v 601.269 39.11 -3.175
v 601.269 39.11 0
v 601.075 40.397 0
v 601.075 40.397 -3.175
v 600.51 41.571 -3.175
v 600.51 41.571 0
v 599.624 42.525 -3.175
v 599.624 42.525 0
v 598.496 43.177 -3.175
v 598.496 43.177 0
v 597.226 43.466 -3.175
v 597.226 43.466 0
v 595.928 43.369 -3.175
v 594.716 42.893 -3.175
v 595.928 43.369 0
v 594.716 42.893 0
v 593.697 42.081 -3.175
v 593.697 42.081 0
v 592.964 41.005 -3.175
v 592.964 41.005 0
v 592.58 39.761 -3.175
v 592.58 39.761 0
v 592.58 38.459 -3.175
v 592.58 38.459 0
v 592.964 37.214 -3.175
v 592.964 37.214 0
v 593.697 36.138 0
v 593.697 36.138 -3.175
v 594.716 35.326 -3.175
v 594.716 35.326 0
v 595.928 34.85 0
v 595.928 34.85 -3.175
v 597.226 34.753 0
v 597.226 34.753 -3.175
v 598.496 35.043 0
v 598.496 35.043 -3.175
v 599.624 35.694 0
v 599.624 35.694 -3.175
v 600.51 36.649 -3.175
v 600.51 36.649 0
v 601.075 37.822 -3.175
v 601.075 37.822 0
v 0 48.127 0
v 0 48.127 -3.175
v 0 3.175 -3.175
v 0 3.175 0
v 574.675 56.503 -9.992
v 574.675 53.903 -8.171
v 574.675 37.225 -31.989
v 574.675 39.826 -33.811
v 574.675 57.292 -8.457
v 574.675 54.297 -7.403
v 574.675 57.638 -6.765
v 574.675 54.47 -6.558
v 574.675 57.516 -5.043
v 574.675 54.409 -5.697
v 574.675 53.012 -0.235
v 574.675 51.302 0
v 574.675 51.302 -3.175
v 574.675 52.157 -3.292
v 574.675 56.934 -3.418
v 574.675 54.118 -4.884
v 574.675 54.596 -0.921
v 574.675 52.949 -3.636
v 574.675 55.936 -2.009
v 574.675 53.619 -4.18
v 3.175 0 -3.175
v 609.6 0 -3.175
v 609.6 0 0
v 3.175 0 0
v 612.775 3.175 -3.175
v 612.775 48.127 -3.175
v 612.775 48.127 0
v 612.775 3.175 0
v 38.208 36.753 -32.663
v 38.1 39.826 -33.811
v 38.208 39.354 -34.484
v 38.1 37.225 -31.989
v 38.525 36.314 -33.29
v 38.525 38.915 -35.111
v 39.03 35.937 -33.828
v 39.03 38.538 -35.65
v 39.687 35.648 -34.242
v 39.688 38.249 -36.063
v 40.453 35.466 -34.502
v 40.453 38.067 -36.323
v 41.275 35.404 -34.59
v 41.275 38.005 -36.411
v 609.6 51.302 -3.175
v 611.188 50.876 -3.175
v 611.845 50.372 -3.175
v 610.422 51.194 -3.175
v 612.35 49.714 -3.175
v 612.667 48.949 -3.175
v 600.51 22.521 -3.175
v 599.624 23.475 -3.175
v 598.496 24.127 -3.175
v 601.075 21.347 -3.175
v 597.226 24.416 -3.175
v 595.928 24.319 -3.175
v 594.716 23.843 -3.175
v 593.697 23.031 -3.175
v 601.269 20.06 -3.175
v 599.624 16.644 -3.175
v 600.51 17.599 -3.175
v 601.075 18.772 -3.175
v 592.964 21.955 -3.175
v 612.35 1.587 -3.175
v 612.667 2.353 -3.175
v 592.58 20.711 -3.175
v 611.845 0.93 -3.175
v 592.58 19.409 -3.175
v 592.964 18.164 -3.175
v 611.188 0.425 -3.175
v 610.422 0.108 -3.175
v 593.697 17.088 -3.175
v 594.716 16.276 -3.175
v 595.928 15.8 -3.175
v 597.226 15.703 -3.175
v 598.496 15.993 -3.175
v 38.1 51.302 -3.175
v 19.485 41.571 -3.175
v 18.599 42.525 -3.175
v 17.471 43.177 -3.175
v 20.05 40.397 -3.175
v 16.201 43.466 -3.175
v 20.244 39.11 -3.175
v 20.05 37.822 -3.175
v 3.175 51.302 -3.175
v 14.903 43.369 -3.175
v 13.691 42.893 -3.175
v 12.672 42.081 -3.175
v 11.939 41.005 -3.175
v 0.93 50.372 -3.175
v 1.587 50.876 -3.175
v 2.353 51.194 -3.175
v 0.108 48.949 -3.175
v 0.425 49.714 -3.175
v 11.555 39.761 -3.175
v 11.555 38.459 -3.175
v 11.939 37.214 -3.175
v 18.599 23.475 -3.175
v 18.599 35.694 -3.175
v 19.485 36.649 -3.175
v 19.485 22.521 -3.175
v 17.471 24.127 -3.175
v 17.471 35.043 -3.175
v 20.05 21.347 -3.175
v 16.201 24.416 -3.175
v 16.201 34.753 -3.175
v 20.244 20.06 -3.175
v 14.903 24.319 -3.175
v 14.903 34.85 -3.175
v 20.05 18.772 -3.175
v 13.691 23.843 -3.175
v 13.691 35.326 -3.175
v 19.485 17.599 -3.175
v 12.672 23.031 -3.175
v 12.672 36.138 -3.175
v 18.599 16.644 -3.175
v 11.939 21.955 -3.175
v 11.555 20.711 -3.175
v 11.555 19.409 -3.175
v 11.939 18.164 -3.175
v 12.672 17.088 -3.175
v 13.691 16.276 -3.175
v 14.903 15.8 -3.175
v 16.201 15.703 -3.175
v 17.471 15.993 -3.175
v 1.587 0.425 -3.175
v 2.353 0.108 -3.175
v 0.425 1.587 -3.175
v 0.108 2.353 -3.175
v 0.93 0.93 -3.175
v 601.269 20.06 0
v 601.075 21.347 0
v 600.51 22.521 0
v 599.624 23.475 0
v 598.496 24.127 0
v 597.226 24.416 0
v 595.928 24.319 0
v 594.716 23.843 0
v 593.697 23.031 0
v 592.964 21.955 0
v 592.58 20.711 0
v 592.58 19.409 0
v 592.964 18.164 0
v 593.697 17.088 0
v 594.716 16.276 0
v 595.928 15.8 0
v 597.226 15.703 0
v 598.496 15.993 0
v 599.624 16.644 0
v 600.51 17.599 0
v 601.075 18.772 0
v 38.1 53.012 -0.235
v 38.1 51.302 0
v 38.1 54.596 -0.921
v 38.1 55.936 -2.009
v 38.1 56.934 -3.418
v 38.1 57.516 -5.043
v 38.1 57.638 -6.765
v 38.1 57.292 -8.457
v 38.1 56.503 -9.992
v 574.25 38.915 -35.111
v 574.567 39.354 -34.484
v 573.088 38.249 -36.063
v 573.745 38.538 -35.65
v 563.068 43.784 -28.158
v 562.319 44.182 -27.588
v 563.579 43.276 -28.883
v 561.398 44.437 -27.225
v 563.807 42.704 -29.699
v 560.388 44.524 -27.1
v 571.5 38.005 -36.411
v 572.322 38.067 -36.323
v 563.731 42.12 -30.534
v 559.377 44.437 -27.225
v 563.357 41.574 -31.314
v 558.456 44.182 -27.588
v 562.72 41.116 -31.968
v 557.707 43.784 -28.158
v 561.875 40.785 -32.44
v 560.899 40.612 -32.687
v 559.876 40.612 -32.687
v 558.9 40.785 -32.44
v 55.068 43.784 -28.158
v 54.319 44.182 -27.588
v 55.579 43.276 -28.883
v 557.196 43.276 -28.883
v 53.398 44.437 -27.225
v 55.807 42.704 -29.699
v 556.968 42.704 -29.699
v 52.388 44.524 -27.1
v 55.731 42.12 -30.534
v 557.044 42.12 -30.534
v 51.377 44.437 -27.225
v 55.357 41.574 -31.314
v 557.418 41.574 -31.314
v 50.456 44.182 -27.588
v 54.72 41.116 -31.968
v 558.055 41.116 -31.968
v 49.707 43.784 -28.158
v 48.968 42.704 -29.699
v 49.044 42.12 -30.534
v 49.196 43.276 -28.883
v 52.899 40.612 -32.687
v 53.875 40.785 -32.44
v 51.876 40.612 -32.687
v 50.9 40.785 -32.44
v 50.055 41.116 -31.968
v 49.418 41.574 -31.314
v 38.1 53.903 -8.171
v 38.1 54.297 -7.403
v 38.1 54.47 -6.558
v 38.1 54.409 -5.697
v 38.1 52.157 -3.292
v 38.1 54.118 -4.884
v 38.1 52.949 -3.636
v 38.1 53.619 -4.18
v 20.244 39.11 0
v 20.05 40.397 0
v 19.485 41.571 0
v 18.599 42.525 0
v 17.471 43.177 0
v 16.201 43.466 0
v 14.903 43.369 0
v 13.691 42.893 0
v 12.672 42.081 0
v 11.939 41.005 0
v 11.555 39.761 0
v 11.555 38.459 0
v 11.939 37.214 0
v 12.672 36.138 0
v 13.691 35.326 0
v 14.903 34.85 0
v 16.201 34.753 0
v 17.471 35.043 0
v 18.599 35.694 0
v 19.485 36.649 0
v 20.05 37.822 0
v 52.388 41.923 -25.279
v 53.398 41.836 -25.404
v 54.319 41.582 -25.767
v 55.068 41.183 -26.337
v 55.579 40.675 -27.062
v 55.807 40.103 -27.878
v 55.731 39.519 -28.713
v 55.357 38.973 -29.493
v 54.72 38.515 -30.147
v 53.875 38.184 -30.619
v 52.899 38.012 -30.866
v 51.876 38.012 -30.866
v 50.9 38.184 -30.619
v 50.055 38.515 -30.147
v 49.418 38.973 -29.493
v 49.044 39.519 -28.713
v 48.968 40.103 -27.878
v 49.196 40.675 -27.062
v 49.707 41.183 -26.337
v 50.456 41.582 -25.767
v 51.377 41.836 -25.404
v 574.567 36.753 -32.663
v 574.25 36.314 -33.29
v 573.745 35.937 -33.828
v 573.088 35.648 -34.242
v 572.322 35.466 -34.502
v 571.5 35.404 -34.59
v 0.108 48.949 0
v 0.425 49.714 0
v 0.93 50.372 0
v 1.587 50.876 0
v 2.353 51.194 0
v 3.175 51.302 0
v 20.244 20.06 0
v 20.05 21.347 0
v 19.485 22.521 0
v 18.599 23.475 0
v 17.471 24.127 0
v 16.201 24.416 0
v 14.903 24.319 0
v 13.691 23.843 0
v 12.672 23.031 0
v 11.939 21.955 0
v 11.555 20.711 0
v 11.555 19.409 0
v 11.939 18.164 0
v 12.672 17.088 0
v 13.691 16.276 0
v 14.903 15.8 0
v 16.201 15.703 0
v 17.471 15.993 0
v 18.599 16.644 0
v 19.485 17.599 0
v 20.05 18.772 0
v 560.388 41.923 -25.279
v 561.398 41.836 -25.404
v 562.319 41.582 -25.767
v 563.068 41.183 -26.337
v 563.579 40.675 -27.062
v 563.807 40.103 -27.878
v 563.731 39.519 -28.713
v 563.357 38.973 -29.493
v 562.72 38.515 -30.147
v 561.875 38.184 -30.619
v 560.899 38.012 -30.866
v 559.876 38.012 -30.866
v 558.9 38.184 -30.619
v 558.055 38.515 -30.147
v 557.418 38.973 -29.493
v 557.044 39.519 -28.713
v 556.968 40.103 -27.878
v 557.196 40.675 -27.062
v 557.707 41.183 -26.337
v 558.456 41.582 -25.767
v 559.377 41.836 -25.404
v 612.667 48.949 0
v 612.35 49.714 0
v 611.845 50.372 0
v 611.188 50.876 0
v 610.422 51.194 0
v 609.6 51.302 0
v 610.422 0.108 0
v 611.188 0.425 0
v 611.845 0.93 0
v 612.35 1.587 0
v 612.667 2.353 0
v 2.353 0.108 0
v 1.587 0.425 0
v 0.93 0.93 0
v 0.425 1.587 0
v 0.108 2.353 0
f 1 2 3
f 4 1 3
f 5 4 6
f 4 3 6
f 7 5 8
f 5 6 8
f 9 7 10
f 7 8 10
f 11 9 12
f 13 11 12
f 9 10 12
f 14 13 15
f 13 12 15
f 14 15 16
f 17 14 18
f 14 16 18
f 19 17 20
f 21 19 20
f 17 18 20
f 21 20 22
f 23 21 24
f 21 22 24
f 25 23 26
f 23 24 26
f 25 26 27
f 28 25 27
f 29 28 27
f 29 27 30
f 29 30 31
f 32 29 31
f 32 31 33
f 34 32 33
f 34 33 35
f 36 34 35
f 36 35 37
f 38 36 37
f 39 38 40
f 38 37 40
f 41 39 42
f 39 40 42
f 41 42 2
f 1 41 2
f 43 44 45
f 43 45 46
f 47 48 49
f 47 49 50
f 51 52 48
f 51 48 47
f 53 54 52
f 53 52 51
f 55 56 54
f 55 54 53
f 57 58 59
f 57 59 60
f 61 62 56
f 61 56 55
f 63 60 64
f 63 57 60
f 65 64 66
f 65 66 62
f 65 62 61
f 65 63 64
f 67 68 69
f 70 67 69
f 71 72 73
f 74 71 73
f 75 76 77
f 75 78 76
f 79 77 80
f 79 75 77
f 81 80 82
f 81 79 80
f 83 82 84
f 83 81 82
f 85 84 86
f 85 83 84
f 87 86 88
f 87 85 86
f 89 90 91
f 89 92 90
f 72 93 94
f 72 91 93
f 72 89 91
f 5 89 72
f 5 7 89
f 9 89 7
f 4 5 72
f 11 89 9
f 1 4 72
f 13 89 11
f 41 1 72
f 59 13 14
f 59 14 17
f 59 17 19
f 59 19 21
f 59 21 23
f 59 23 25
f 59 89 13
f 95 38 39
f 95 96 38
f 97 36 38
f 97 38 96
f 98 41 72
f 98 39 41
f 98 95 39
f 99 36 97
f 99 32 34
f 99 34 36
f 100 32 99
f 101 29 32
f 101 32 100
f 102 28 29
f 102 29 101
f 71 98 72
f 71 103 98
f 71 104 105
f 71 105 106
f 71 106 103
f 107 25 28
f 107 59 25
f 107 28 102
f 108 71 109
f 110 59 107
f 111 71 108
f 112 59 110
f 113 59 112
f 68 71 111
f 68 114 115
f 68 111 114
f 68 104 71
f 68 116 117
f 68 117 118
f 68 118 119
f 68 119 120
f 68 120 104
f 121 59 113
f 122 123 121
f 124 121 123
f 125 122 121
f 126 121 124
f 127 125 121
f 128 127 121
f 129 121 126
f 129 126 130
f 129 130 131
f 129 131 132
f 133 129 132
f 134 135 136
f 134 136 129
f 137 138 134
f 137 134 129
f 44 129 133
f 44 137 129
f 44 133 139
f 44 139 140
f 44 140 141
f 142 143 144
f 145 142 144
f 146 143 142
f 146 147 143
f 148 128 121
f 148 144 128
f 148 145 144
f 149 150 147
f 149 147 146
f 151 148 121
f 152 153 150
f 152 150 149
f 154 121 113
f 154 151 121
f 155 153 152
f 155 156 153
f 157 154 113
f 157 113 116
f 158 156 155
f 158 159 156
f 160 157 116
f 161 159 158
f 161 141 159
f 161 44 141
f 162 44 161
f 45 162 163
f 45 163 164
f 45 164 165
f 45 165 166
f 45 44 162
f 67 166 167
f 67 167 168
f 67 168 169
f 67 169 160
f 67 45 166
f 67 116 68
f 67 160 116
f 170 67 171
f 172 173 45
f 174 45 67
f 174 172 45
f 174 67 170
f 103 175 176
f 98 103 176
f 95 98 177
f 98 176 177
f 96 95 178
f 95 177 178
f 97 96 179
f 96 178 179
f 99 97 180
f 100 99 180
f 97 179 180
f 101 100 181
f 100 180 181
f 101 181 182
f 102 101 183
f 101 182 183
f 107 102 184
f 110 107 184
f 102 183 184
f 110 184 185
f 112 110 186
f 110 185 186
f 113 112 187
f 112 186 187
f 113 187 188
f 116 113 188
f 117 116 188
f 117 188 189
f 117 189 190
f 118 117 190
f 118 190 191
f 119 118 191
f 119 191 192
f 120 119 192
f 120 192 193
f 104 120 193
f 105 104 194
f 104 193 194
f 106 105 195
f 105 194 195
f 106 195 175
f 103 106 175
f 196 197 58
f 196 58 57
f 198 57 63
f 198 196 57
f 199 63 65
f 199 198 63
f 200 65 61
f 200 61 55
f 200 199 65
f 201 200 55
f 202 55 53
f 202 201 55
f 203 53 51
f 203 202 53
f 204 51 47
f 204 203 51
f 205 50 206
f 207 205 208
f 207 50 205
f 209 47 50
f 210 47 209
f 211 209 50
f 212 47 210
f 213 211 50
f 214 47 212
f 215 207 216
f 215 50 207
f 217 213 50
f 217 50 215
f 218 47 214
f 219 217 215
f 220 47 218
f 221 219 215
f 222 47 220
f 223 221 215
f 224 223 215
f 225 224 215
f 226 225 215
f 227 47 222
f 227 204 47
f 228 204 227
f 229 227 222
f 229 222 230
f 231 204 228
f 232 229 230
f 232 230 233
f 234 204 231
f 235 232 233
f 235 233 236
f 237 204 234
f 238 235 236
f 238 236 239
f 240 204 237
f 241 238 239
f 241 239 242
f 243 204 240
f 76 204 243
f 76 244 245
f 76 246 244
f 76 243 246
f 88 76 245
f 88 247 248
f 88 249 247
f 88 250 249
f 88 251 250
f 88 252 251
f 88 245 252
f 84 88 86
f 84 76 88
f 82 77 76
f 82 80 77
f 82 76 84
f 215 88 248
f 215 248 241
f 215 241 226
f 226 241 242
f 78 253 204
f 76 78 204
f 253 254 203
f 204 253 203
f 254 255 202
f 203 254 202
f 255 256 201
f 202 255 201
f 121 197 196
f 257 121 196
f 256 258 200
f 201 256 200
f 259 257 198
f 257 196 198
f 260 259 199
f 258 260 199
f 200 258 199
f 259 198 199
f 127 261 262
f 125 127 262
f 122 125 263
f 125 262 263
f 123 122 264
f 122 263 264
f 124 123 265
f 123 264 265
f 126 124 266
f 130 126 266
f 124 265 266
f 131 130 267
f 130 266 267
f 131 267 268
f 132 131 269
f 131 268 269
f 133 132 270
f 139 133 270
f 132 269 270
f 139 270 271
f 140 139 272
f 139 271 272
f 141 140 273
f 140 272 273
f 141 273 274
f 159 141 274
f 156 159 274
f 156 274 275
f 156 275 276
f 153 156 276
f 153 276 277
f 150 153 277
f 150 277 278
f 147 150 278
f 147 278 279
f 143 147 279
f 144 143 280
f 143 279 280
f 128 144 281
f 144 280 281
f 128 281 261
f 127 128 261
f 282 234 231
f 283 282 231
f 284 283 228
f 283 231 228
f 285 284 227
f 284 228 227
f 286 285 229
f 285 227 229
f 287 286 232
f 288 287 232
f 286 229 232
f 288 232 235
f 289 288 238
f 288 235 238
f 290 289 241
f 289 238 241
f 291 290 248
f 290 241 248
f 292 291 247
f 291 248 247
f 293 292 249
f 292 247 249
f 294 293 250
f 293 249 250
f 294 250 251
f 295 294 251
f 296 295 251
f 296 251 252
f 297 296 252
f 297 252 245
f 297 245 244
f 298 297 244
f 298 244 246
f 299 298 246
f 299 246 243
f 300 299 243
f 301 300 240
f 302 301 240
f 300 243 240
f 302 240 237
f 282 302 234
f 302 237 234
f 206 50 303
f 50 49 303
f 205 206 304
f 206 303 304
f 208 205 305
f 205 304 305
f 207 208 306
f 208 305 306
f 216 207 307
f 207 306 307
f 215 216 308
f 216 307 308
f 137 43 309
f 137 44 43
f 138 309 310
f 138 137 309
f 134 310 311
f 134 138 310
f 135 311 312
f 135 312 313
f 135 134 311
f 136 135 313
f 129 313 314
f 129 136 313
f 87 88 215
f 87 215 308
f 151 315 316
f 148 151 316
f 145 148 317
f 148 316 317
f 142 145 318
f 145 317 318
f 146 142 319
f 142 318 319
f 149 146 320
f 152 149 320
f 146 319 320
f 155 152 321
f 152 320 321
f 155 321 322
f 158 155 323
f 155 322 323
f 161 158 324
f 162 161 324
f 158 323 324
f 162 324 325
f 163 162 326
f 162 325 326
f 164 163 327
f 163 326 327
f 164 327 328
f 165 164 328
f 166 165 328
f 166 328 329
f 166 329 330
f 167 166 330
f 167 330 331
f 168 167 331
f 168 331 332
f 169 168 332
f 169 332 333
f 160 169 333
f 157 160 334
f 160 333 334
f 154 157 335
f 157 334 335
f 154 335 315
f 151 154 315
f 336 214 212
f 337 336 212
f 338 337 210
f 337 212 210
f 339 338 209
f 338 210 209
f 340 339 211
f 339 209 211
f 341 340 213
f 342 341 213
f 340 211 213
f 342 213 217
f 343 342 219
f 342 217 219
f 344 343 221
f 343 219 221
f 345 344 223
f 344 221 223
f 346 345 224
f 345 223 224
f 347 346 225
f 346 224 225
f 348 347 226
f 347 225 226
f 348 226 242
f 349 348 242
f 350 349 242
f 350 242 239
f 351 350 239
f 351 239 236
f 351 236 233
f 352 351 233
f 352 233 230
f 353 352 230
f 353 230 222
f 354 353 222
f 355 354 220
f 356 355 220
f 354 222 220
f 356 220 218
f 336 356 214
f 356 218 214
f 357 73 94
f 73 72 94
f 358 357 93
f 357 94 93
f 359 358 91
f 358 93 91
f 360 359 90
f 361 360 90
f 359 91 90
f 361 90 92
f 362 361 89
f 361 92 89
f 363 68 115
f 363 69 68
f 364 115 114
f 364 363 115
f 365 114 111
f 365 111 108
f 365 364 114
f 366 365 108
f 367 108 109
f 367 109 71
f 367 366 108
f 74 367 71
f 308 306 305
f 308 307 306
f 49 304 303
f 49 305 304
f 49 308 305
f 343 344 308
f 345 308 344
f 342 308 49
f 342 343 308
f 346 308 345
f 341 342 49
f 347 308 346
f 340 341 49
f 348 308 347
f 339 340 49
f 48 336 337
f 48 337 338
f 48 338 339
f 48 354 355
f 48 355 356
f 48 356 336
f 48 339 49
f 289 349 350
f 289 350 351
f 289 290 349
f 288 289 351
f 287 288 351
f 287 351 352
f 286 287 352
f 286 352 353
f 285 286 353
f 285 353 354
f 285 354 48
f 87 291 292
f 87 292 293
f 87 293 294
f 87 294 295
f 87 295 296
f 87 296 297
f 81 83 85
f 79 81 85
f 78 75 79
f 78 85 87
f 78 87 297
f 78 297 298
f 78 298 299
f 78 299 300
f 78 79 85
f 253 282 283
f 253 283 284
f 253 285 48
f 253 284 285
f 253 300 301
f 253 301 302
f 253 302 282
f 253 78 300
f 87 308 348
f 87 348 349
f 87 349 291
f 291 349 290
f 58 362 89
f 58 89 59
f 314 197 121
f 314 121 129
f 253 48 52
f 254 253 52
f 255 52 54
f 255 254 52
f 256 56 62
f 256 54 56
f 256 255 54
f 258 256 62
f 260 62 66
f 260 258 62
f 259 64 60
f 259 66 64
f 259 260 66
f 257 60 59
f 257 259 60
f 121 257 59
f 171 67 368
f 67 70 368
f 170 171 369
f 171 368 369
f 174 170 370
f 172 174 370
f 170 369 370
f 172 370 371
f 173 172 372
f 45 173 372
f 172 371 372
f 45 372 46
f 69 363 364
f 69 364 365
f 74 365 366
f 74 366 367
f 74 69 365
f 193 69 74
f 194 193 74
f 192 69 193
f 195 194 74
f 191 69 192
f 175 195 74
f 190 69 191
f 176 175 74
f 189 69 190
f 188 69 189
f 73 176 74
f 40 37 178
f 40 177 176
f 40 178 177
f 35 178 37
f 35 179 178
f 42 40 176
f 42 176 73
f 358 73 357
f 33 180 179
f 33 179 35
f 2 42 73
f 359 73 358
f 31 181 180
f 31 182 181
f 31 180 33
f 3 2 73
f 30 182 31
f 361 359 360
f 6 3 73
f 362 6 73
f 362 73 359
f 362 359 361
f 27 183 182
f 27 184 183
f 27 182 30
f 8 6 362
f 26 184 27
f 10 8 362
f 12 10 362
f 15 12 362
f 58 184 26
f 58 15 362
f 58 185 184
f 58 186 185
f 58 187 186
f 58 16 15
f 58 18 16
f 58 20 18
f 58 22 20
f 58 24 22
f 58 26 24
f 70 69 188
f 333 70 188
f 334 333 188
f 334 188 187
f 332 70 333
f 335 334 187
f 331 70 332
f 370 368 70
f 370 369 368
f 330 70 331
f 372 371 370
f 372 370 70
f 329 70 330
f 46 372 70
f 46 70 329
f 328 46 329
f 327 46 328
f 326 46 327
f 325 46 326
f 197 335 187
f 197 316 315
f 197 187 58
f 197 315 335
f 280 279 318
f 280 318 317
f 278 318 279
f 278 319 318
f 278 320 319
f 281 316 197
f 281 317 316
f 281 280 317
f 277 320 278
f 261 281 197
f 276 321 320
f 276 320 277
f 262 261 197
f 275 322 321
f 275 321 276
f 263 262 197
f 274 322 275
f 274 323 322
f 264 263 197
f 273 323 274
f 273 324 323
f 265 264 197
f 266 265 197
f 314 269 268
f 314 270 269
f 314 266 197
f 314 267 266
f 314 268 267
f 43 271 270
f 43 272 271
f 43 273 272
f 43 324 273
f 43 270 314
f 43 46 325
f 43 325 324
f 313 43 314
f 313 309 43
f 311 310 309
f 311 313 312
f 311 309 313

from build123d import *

# Parameters (mm, degrees)
BASE_FLANGE1_DEPTH       = 612.775
CUT_EXTRUDE1_OUTLINE_W   = 38.1
CUT_EXTRUDE1_OUTLINE_H   = 57.651763494
CUT_EXTRUDE1_DEPTH       = 33.236308369
CUT_EXTRUDE1_START       = -3.175
CUT_EXTRUDE1_2_OUTLINE_W = 38.1
CUT_EXTRUDE1_2_OUTLINE_H = 6.35
CUT_EXTRUDE1_2_DEPTH     = 3.175
SKETCH7_R                = 4.3688
CUT_EXTRUDE2_DEPTH       = 3.175
SKETCH8_R                = 3.429
CUT_EXTRUDE3_DEPTH       = 3.175
FILLET1_R                = 3.175


# Read off the part's stored shape, not the designer's step: Cut-Extrude1
# Sheet-metal steps are written as plain solids
with BuildPart() as part:
    # Sketch1 → Base-Flange1 (new body)
    with BuildSketch(Plane(origin=(0, 0, 0), x_dir=(0, 0, -1), z_dir=(1, 0, 0))):
        with BuildLine():
            Line((0, 0), (0, 51.301763494))
            ThreePointArc((0, 51.301763494), (3.417896306, 56.934282284), (9.992210371, 56.503378975))
            Line((9.992210371, 56.503378975), (36.411308369, 38.004527404))
            Line((36.411308369, 38.004527404), (34.590203183, 35.403719664))
            Line((34.590203183, 35.403719664), (8.171105185, 53.902571234))
            ThreePointArc((8.171105185, 53.902571234), (4.883948153, 54.118022889), (3.175, 51.301763494))
            Line((3.175, 51.301763494), (3.175, 0))
            Line((3.175, 0), (0, 0))
        make_face()
    extrude(amount=BASE_FLANGE1_DEPTH)

    # Cut-Extrude1 outline → Cut-Extrude1 (cut)
    with BuildSketch(Plane(origin=(0, 0, -3.175), x_dir=(-1, 0, 0), z_dir=(0, 0, -1))):
        with Locations((-593.725, 28.825881747)):
            Rectangle(CUT_EXTRUDE1_OUTLINE_W, CUT_EXTRUDE1_OUTLINE_H)
        with Locations((-19.05, 28.825881747)):
            Rectangle(CUT_EXTRUDE1_OUTLINE_W, CUT_EXTRUDE1_OUTLINE_H)
    extrude(amount=CUT_EXTRUDE1_DEPTH, mode=Mode.SUBTRACT)

    # Cut-Extrude1 2 outline → Cut-Extrude1 2 (cut)
    with BuildSketch(Plane(origin=(0, 0, -3.175), x_dir=(-1, 0, 0), z_dir=(0, 0, -1)).offset(CUT_EXTRUDE1_START)):
        with Locations((-593.725, 54.476763494)):
            Rectangle(CUT_EXTRUDE1_2_OUTLINE_W, CUT_EXTRUDE1_2_OUTLINE_H)
        with Locations((-19.05, 54.476763494)):
            Rectangle(CUT_EXTRUDE1_2_OUTLINE_W, CUT_EXTRUDE1_2_OUTLINE_H)
    extrude(amount=CUT_EXTRUDE1_2_DEPTH, mode=Mode.SUBTRACT)

    # Sketch7 → Cut-Extrude2 (cut)
    with BuildSketch(Plane.XY):
        with Locations((15.875, 39.109763494)):
            Circle(SKETCH7_R)
        with Locations((15.875, 20.059763494)):
            Circle(SKETCH7_R)
        with Locations((596.9, 39.109763494)):
            Circle(SKETCH7_R)
        with Locations((596.9, 20.059763494)):
            Circle(SKETCH7_R)
    extrude(amount=-CUT_EXTRUDE2_DEPTH, mode=Mode.SUBTRACT)

    # Sketch8 → Cut-Extrude3 (cut)
    with BuildSketch(Plane(origin=(0, 42.609139551, -29.83524071), x_dir=(1, 0, 0), z_dir=(0, 0.819152044288989, -0.5735764363510502))):
        with Locations(Location((560.3875, 0.090396292, 0), (0, 0, 270))):
            Circle(SKETCH8_R)
        with Locations(Location((52.3875, 0.090396292, 0), (0, 0, 270))):
            Circle(SKETCH8_R)
    extrude(amount=-CUT_EXTRUDE3_DEPTH, mode=Mode.SUBTRACT)

    # Fillet1
    fillet1_edges = [part.edges().sort_by_distance(p)[0] for p in [
        (0, 51.301763494, -1.5875),
        (612.775, 51.301763494, -1.5875),
        (612.775, 0, -1.5875),
        (38.1, 36.704123534, -35.500755776),
        (574.675, 36.704123534, -35.500755776),
        (0, 0, -1.5875),
    ]]
    fillet(fillet1_edges, radius=FILLET1_R)


solid = part.part
